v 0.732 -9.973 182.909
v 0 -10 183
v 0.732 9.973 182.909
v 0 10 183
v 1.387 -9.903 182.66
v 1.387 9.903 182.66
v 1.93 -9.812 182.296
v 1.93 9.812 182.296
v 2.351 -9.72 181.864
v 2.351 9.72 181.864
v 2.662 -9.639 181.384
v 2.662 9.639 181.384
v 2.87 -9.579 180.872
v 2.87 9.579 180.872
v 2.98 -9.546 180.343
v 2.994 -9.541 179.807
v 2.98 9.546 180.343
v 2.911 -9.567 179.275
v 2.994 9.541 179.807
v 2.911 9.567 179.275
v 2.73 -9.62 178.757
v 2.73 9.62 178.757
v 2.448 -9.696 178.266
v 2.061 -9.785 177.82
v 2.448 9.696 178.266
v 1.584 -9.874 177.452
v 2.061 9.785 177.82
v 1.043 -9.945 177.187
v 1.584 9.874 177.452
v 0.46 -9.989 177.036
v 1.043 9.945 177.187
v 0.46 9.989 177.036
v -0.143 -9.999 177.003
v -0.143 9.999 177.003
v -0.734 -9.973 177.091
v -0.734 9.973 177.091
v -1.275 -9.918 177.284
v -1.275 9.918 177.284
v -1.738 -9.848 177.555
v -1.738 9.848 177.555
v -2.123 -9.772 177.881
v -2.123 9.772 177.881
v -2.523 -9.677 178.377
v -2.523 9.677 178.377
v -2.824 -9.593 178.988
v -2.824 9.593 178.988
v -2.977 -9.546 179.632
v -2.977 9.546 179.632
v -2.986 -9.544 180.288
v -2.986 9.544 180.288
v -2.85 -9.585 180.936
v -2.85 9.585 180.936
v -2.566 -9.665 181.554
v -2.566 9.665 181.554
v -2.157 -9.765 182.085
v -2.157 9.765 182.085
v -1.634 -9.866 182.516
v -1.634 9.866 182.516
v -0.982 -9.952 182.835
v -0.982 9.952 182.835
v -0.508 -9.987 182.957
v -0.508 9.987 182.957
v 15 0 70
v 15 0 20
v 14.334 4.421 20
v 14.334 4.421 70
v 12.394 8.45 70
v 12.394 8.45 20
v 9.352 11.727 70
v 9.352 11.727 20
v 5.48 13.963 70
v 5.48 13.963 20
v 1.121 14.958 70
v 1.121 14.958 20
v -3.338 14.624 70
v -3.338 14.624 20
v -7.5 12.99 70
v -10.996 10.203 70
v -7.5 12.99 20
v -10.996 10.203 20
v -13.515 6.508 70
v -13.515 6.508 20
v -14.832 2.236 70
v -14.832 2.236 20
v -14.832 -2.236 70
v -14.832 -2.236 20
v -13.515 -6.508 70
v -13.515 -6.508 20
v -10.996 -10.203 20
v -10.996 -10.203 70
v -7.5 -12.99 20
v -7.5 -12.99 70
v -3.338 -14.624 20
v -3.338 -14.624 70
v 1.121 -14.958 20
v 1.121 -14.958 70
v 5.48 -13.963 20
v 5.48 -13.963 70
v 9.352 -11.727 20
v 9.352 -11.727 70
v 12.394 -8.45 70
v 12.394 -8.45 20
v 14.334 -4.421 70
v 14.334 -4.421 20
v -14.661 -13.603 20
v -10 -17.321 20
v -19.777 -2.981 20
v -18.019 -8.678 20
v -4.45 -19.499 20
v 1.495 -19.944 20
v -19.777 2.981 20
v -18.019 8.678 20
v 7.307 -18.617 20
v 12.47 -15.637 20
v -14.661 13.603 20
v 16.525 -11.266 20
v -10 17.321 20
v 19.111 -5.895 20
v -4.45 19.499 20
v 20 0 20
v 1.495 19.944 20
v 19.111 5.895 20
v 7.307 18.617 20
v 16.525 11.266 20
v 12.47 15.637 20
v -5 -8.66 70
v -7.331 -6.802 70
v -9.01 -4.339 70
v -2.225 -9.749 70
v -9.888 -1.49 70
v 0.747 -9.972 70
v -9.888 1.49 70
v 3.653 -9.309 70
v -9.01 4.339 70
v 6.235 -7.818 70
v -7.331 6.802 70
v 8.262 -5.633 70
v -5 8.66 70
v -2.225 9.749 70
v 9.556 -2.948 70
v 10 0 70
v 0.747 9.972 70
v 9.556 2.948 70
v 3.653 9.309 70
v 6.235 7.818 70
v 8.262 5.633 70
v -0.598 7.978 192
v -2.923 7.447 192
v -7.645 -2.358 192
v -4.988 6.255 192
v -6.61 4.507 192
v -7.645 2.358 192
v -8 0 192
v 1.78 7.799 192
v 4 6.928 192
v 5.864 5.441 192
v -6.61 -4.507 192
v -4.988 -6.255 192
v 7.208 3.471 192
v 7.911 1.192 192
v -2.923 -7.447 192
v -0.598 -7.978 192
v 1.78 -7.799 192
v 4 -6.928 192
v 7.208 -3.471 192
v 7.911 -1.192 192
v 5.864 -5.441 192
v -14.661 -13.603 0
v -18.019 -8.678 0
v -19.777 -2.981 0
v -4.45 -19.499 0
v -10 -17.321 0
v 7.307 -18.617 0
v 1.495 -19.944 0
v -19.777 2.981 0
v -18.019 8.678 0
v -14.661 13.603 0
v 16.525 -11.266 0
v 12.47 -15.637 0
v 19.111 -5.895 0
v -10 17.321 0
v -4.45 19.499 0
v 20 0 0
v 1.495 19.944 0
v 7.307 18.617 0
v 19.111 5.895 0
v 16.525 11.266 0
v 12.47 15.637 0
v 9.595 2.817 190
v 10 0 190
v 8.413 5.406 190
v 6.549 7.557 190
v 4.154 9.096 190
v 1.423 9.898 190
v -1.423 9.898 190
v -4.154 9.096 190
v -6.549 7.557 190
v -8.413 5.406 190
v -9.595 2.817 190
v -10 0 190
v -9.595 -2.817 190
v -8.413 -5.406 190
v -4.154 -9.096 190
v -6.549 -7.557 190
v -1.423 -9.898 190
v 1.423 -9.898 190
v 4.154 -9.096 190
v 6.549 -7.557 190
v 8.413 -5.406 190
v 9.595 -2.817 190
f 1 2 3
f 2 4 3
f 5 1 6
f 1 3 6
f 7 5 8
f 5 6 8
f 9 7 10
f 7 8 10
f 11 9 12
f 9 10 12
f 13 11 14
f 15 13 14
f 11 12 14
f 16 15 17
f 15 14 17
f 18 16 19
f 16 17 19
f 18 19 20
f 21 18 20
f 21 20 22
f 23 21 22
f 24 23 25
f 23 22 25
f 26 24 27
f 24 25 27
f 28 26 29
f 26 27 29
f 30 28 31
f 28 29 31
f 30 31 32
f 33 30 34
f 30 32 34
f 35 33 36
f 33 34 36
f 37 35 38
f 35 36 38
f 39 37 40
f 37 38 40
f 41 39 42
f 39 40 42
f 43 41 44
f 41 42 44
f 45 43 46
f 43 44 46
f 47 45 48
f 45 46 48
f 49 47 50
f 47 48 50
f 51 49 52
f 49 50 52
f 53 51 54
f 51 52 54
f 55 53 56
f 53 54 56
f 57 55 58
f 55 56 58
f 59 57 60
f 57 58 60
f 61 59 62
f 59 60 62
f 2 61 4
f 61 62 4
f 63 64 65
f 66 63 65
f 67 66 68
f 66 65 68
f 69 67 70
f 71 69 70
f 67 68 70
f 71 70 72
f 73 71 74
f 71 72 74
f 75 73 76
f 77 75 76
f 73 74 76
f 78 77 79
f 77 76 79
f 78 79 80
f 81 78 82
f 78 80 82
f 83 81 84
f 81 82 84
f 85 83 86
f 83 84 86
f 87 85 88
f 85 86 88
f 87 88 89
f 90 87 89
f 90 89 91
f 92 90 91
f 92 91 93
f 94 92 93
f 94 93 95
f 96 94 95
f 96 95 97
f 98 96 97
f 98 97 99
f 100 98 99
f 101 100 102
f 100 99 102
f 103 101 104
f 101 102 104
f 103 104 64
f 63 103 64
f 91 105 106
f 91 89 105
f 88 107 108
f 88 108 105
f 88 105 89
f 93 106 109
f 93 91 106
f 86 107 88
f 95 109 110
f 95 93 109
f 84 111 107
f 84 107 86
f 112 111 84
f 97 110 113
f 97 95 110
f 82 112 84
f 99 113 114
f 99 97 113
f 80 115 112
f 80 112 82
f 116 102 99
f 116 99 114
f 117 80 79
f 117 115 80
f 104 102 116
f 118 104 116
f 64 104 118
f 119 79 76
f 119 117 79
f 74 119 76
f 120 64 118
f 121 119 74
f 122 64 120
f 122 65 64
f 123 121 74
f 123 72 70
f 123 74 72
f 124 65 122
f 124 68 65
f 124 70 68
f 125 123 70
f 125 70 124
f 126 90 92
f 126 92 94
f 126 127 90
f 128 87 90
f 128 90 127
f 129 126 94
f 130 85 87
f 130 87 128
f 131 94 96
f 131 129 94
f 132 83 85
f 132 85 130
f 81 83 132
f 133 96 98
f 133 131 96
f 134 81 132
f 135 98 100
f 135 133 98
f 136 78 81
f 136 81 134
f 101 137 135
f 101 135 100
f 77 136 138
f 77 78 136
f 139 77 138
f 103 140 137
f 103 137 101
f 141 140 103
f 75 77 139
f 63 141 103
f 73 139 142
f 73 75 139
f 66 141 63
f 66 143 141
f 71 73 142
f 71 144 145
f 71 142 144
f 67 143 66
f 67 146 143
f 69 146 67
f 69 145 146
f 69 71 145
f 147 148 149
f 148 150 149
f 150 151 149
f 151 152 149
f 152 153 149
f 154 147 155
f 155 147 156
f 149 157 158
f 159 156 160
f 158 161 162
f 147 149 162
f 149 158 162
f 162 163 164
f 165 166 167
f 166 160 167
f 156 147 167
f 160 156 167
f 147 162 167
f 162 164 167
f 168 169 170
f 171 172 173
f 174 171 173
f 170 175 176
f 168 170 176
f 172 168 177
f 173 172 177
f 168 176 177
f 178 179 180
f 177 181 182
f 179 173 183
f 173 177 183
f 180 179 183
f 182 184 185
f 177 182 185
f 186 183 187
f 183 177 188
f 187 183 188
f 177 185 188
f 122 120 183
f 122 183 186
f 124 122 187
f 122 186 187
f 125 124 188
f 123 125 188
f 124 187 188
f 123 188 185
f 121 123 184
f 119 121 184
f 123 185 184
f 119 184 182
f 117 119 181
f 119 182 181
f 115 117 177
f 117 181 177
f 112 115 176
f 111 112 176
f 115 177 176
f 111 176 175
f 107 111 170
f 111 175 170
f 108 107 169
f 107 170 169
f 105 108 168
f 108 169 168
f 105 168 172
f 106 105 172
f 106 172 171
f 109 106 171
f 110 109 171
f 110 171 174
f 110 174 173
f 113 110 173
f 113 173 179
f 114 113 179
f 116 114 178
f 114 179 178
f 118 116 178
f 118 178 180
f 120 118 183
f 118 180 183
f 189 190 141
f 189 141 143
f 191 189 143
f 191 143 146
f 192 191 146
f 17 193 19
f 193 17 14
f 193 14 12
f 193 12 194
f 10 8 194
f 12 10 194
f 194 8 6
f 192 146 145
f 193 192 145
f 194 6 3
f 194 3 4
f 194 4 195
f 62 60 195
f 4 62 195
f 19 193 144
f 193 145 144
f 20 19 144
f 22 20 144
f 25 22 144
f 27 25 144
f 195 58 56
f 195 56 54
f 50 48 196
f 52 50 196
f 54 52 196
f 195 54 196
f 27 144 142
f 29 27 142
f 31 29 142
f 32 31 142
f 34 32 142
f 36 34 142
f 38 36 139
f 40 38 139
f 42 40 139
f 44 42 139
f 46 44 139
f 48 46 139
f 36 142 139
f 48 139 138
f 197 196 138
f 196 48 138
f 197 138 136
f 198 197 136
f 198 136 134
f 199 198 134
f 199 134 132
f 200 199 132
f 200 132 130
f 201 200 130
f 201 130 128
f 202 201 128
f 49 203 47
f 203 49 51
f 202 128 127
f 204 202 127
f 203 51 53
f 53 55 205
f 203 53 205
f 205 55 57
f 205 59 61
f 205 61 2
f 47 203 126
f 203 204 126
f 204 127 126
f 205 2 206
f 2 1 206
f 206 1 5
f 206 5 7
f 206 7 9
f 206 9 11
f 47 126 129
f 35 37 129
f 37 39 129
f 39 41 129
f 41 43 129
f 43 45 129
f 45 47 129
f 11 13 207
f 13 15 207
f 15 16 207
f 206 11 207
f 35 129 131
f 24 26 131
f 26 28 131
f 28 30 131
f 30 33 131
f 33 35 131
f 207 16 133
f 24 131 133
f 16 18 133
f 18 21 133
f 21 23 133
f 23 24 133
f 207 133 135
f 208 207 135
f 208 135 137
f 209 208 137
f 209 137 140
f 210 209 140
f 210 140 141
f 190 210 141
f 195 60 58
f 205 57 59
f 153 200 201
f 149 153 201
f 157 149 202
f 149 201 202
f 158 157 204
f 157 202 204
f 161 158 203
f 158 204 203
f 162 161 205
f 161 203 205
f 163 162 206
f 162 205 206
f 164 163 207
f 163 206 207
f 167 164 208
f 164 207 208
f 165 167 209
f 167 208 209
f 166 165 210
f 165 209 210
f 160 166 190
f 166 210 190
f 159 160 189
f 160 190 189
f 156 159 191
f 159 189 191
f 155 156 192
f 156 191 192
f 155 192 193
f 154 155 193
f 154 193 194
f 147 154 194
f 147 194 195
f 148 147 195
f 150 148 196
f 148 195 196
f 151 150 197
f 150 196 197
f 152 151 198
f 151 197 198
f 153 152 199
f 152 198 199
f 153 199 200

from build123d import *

# Parameters (mm, degrees)
SKETCH1_R           = 20
BOSS_EXTRUDE1_DEPTH = 20
SKETCH2_R           = 15
BOSS_EXTRUDE2_DEPTH = 50
SKETCH3_R           = 10
BOSS_EXTRUDE3_DEPTH = 120
SKETCH6_R           = 3
CUT_EXTRUDE1_DEPTH  = 22


with BuildPart() as part:
    # Sketch1 → Boss-Extrude1 (new body)
    with BuildSketch(Plane.XY):
        Circle(SKETCH1_R)
    extrude(amount=BOSS_EXTRUDE1_DEPTH)

    # Sketch2 → Boss-Extrude2 (add)
    with BuildSketch(Plane.XY.offset(20)):
        Circle(SKETCH2_R)
    extrude(amount=BOSS_EXTRUDE2_DEPTH)

    # Sketch3 → Boss-Extrude3 (add)
    with BuildSketch(Plane.XY.offset(70)):
        Circle(SKETCH3_R)
    extrude(amount=BOSS_EXTRUDE3_DEPTH)

    # Sketch5 → Revolve1 (revolve)
    with BuildSketch(Plane(origin=(0, 0, 0), x_dir=(0, 0, -1), z_dir=(1, 0, 0)), mode=Mode.PRIVATE) as revolve1_sk:
        Polygon((-190, 0), (-192, 0), (-192, -8), (-190, -10), align=None)
    revolve(revolve1_sk.sketch.rotate(Axis((0, 0, -30.365330672), (0, 0, 1)), 270), axis=Axis((0, 0, -30.365330672), (0, 0, 1)))

    # Sketch6 → Cut-Extrude1 (cut, symmetric)
    with BuildSketch(Plane(origin=(0, 0, 0), x_dir=(1, 0, 0), z_dir=(0, 1, 0))):
        with Locations(Location((0, -180, 0), (0, 0, 270))):
            Circle(SKETCH6_R)
    extrude(amount=CUT_EXTRUDE1_DEPTH, both=True, mode=Mode.SUBTRACT)


solid = part.part
